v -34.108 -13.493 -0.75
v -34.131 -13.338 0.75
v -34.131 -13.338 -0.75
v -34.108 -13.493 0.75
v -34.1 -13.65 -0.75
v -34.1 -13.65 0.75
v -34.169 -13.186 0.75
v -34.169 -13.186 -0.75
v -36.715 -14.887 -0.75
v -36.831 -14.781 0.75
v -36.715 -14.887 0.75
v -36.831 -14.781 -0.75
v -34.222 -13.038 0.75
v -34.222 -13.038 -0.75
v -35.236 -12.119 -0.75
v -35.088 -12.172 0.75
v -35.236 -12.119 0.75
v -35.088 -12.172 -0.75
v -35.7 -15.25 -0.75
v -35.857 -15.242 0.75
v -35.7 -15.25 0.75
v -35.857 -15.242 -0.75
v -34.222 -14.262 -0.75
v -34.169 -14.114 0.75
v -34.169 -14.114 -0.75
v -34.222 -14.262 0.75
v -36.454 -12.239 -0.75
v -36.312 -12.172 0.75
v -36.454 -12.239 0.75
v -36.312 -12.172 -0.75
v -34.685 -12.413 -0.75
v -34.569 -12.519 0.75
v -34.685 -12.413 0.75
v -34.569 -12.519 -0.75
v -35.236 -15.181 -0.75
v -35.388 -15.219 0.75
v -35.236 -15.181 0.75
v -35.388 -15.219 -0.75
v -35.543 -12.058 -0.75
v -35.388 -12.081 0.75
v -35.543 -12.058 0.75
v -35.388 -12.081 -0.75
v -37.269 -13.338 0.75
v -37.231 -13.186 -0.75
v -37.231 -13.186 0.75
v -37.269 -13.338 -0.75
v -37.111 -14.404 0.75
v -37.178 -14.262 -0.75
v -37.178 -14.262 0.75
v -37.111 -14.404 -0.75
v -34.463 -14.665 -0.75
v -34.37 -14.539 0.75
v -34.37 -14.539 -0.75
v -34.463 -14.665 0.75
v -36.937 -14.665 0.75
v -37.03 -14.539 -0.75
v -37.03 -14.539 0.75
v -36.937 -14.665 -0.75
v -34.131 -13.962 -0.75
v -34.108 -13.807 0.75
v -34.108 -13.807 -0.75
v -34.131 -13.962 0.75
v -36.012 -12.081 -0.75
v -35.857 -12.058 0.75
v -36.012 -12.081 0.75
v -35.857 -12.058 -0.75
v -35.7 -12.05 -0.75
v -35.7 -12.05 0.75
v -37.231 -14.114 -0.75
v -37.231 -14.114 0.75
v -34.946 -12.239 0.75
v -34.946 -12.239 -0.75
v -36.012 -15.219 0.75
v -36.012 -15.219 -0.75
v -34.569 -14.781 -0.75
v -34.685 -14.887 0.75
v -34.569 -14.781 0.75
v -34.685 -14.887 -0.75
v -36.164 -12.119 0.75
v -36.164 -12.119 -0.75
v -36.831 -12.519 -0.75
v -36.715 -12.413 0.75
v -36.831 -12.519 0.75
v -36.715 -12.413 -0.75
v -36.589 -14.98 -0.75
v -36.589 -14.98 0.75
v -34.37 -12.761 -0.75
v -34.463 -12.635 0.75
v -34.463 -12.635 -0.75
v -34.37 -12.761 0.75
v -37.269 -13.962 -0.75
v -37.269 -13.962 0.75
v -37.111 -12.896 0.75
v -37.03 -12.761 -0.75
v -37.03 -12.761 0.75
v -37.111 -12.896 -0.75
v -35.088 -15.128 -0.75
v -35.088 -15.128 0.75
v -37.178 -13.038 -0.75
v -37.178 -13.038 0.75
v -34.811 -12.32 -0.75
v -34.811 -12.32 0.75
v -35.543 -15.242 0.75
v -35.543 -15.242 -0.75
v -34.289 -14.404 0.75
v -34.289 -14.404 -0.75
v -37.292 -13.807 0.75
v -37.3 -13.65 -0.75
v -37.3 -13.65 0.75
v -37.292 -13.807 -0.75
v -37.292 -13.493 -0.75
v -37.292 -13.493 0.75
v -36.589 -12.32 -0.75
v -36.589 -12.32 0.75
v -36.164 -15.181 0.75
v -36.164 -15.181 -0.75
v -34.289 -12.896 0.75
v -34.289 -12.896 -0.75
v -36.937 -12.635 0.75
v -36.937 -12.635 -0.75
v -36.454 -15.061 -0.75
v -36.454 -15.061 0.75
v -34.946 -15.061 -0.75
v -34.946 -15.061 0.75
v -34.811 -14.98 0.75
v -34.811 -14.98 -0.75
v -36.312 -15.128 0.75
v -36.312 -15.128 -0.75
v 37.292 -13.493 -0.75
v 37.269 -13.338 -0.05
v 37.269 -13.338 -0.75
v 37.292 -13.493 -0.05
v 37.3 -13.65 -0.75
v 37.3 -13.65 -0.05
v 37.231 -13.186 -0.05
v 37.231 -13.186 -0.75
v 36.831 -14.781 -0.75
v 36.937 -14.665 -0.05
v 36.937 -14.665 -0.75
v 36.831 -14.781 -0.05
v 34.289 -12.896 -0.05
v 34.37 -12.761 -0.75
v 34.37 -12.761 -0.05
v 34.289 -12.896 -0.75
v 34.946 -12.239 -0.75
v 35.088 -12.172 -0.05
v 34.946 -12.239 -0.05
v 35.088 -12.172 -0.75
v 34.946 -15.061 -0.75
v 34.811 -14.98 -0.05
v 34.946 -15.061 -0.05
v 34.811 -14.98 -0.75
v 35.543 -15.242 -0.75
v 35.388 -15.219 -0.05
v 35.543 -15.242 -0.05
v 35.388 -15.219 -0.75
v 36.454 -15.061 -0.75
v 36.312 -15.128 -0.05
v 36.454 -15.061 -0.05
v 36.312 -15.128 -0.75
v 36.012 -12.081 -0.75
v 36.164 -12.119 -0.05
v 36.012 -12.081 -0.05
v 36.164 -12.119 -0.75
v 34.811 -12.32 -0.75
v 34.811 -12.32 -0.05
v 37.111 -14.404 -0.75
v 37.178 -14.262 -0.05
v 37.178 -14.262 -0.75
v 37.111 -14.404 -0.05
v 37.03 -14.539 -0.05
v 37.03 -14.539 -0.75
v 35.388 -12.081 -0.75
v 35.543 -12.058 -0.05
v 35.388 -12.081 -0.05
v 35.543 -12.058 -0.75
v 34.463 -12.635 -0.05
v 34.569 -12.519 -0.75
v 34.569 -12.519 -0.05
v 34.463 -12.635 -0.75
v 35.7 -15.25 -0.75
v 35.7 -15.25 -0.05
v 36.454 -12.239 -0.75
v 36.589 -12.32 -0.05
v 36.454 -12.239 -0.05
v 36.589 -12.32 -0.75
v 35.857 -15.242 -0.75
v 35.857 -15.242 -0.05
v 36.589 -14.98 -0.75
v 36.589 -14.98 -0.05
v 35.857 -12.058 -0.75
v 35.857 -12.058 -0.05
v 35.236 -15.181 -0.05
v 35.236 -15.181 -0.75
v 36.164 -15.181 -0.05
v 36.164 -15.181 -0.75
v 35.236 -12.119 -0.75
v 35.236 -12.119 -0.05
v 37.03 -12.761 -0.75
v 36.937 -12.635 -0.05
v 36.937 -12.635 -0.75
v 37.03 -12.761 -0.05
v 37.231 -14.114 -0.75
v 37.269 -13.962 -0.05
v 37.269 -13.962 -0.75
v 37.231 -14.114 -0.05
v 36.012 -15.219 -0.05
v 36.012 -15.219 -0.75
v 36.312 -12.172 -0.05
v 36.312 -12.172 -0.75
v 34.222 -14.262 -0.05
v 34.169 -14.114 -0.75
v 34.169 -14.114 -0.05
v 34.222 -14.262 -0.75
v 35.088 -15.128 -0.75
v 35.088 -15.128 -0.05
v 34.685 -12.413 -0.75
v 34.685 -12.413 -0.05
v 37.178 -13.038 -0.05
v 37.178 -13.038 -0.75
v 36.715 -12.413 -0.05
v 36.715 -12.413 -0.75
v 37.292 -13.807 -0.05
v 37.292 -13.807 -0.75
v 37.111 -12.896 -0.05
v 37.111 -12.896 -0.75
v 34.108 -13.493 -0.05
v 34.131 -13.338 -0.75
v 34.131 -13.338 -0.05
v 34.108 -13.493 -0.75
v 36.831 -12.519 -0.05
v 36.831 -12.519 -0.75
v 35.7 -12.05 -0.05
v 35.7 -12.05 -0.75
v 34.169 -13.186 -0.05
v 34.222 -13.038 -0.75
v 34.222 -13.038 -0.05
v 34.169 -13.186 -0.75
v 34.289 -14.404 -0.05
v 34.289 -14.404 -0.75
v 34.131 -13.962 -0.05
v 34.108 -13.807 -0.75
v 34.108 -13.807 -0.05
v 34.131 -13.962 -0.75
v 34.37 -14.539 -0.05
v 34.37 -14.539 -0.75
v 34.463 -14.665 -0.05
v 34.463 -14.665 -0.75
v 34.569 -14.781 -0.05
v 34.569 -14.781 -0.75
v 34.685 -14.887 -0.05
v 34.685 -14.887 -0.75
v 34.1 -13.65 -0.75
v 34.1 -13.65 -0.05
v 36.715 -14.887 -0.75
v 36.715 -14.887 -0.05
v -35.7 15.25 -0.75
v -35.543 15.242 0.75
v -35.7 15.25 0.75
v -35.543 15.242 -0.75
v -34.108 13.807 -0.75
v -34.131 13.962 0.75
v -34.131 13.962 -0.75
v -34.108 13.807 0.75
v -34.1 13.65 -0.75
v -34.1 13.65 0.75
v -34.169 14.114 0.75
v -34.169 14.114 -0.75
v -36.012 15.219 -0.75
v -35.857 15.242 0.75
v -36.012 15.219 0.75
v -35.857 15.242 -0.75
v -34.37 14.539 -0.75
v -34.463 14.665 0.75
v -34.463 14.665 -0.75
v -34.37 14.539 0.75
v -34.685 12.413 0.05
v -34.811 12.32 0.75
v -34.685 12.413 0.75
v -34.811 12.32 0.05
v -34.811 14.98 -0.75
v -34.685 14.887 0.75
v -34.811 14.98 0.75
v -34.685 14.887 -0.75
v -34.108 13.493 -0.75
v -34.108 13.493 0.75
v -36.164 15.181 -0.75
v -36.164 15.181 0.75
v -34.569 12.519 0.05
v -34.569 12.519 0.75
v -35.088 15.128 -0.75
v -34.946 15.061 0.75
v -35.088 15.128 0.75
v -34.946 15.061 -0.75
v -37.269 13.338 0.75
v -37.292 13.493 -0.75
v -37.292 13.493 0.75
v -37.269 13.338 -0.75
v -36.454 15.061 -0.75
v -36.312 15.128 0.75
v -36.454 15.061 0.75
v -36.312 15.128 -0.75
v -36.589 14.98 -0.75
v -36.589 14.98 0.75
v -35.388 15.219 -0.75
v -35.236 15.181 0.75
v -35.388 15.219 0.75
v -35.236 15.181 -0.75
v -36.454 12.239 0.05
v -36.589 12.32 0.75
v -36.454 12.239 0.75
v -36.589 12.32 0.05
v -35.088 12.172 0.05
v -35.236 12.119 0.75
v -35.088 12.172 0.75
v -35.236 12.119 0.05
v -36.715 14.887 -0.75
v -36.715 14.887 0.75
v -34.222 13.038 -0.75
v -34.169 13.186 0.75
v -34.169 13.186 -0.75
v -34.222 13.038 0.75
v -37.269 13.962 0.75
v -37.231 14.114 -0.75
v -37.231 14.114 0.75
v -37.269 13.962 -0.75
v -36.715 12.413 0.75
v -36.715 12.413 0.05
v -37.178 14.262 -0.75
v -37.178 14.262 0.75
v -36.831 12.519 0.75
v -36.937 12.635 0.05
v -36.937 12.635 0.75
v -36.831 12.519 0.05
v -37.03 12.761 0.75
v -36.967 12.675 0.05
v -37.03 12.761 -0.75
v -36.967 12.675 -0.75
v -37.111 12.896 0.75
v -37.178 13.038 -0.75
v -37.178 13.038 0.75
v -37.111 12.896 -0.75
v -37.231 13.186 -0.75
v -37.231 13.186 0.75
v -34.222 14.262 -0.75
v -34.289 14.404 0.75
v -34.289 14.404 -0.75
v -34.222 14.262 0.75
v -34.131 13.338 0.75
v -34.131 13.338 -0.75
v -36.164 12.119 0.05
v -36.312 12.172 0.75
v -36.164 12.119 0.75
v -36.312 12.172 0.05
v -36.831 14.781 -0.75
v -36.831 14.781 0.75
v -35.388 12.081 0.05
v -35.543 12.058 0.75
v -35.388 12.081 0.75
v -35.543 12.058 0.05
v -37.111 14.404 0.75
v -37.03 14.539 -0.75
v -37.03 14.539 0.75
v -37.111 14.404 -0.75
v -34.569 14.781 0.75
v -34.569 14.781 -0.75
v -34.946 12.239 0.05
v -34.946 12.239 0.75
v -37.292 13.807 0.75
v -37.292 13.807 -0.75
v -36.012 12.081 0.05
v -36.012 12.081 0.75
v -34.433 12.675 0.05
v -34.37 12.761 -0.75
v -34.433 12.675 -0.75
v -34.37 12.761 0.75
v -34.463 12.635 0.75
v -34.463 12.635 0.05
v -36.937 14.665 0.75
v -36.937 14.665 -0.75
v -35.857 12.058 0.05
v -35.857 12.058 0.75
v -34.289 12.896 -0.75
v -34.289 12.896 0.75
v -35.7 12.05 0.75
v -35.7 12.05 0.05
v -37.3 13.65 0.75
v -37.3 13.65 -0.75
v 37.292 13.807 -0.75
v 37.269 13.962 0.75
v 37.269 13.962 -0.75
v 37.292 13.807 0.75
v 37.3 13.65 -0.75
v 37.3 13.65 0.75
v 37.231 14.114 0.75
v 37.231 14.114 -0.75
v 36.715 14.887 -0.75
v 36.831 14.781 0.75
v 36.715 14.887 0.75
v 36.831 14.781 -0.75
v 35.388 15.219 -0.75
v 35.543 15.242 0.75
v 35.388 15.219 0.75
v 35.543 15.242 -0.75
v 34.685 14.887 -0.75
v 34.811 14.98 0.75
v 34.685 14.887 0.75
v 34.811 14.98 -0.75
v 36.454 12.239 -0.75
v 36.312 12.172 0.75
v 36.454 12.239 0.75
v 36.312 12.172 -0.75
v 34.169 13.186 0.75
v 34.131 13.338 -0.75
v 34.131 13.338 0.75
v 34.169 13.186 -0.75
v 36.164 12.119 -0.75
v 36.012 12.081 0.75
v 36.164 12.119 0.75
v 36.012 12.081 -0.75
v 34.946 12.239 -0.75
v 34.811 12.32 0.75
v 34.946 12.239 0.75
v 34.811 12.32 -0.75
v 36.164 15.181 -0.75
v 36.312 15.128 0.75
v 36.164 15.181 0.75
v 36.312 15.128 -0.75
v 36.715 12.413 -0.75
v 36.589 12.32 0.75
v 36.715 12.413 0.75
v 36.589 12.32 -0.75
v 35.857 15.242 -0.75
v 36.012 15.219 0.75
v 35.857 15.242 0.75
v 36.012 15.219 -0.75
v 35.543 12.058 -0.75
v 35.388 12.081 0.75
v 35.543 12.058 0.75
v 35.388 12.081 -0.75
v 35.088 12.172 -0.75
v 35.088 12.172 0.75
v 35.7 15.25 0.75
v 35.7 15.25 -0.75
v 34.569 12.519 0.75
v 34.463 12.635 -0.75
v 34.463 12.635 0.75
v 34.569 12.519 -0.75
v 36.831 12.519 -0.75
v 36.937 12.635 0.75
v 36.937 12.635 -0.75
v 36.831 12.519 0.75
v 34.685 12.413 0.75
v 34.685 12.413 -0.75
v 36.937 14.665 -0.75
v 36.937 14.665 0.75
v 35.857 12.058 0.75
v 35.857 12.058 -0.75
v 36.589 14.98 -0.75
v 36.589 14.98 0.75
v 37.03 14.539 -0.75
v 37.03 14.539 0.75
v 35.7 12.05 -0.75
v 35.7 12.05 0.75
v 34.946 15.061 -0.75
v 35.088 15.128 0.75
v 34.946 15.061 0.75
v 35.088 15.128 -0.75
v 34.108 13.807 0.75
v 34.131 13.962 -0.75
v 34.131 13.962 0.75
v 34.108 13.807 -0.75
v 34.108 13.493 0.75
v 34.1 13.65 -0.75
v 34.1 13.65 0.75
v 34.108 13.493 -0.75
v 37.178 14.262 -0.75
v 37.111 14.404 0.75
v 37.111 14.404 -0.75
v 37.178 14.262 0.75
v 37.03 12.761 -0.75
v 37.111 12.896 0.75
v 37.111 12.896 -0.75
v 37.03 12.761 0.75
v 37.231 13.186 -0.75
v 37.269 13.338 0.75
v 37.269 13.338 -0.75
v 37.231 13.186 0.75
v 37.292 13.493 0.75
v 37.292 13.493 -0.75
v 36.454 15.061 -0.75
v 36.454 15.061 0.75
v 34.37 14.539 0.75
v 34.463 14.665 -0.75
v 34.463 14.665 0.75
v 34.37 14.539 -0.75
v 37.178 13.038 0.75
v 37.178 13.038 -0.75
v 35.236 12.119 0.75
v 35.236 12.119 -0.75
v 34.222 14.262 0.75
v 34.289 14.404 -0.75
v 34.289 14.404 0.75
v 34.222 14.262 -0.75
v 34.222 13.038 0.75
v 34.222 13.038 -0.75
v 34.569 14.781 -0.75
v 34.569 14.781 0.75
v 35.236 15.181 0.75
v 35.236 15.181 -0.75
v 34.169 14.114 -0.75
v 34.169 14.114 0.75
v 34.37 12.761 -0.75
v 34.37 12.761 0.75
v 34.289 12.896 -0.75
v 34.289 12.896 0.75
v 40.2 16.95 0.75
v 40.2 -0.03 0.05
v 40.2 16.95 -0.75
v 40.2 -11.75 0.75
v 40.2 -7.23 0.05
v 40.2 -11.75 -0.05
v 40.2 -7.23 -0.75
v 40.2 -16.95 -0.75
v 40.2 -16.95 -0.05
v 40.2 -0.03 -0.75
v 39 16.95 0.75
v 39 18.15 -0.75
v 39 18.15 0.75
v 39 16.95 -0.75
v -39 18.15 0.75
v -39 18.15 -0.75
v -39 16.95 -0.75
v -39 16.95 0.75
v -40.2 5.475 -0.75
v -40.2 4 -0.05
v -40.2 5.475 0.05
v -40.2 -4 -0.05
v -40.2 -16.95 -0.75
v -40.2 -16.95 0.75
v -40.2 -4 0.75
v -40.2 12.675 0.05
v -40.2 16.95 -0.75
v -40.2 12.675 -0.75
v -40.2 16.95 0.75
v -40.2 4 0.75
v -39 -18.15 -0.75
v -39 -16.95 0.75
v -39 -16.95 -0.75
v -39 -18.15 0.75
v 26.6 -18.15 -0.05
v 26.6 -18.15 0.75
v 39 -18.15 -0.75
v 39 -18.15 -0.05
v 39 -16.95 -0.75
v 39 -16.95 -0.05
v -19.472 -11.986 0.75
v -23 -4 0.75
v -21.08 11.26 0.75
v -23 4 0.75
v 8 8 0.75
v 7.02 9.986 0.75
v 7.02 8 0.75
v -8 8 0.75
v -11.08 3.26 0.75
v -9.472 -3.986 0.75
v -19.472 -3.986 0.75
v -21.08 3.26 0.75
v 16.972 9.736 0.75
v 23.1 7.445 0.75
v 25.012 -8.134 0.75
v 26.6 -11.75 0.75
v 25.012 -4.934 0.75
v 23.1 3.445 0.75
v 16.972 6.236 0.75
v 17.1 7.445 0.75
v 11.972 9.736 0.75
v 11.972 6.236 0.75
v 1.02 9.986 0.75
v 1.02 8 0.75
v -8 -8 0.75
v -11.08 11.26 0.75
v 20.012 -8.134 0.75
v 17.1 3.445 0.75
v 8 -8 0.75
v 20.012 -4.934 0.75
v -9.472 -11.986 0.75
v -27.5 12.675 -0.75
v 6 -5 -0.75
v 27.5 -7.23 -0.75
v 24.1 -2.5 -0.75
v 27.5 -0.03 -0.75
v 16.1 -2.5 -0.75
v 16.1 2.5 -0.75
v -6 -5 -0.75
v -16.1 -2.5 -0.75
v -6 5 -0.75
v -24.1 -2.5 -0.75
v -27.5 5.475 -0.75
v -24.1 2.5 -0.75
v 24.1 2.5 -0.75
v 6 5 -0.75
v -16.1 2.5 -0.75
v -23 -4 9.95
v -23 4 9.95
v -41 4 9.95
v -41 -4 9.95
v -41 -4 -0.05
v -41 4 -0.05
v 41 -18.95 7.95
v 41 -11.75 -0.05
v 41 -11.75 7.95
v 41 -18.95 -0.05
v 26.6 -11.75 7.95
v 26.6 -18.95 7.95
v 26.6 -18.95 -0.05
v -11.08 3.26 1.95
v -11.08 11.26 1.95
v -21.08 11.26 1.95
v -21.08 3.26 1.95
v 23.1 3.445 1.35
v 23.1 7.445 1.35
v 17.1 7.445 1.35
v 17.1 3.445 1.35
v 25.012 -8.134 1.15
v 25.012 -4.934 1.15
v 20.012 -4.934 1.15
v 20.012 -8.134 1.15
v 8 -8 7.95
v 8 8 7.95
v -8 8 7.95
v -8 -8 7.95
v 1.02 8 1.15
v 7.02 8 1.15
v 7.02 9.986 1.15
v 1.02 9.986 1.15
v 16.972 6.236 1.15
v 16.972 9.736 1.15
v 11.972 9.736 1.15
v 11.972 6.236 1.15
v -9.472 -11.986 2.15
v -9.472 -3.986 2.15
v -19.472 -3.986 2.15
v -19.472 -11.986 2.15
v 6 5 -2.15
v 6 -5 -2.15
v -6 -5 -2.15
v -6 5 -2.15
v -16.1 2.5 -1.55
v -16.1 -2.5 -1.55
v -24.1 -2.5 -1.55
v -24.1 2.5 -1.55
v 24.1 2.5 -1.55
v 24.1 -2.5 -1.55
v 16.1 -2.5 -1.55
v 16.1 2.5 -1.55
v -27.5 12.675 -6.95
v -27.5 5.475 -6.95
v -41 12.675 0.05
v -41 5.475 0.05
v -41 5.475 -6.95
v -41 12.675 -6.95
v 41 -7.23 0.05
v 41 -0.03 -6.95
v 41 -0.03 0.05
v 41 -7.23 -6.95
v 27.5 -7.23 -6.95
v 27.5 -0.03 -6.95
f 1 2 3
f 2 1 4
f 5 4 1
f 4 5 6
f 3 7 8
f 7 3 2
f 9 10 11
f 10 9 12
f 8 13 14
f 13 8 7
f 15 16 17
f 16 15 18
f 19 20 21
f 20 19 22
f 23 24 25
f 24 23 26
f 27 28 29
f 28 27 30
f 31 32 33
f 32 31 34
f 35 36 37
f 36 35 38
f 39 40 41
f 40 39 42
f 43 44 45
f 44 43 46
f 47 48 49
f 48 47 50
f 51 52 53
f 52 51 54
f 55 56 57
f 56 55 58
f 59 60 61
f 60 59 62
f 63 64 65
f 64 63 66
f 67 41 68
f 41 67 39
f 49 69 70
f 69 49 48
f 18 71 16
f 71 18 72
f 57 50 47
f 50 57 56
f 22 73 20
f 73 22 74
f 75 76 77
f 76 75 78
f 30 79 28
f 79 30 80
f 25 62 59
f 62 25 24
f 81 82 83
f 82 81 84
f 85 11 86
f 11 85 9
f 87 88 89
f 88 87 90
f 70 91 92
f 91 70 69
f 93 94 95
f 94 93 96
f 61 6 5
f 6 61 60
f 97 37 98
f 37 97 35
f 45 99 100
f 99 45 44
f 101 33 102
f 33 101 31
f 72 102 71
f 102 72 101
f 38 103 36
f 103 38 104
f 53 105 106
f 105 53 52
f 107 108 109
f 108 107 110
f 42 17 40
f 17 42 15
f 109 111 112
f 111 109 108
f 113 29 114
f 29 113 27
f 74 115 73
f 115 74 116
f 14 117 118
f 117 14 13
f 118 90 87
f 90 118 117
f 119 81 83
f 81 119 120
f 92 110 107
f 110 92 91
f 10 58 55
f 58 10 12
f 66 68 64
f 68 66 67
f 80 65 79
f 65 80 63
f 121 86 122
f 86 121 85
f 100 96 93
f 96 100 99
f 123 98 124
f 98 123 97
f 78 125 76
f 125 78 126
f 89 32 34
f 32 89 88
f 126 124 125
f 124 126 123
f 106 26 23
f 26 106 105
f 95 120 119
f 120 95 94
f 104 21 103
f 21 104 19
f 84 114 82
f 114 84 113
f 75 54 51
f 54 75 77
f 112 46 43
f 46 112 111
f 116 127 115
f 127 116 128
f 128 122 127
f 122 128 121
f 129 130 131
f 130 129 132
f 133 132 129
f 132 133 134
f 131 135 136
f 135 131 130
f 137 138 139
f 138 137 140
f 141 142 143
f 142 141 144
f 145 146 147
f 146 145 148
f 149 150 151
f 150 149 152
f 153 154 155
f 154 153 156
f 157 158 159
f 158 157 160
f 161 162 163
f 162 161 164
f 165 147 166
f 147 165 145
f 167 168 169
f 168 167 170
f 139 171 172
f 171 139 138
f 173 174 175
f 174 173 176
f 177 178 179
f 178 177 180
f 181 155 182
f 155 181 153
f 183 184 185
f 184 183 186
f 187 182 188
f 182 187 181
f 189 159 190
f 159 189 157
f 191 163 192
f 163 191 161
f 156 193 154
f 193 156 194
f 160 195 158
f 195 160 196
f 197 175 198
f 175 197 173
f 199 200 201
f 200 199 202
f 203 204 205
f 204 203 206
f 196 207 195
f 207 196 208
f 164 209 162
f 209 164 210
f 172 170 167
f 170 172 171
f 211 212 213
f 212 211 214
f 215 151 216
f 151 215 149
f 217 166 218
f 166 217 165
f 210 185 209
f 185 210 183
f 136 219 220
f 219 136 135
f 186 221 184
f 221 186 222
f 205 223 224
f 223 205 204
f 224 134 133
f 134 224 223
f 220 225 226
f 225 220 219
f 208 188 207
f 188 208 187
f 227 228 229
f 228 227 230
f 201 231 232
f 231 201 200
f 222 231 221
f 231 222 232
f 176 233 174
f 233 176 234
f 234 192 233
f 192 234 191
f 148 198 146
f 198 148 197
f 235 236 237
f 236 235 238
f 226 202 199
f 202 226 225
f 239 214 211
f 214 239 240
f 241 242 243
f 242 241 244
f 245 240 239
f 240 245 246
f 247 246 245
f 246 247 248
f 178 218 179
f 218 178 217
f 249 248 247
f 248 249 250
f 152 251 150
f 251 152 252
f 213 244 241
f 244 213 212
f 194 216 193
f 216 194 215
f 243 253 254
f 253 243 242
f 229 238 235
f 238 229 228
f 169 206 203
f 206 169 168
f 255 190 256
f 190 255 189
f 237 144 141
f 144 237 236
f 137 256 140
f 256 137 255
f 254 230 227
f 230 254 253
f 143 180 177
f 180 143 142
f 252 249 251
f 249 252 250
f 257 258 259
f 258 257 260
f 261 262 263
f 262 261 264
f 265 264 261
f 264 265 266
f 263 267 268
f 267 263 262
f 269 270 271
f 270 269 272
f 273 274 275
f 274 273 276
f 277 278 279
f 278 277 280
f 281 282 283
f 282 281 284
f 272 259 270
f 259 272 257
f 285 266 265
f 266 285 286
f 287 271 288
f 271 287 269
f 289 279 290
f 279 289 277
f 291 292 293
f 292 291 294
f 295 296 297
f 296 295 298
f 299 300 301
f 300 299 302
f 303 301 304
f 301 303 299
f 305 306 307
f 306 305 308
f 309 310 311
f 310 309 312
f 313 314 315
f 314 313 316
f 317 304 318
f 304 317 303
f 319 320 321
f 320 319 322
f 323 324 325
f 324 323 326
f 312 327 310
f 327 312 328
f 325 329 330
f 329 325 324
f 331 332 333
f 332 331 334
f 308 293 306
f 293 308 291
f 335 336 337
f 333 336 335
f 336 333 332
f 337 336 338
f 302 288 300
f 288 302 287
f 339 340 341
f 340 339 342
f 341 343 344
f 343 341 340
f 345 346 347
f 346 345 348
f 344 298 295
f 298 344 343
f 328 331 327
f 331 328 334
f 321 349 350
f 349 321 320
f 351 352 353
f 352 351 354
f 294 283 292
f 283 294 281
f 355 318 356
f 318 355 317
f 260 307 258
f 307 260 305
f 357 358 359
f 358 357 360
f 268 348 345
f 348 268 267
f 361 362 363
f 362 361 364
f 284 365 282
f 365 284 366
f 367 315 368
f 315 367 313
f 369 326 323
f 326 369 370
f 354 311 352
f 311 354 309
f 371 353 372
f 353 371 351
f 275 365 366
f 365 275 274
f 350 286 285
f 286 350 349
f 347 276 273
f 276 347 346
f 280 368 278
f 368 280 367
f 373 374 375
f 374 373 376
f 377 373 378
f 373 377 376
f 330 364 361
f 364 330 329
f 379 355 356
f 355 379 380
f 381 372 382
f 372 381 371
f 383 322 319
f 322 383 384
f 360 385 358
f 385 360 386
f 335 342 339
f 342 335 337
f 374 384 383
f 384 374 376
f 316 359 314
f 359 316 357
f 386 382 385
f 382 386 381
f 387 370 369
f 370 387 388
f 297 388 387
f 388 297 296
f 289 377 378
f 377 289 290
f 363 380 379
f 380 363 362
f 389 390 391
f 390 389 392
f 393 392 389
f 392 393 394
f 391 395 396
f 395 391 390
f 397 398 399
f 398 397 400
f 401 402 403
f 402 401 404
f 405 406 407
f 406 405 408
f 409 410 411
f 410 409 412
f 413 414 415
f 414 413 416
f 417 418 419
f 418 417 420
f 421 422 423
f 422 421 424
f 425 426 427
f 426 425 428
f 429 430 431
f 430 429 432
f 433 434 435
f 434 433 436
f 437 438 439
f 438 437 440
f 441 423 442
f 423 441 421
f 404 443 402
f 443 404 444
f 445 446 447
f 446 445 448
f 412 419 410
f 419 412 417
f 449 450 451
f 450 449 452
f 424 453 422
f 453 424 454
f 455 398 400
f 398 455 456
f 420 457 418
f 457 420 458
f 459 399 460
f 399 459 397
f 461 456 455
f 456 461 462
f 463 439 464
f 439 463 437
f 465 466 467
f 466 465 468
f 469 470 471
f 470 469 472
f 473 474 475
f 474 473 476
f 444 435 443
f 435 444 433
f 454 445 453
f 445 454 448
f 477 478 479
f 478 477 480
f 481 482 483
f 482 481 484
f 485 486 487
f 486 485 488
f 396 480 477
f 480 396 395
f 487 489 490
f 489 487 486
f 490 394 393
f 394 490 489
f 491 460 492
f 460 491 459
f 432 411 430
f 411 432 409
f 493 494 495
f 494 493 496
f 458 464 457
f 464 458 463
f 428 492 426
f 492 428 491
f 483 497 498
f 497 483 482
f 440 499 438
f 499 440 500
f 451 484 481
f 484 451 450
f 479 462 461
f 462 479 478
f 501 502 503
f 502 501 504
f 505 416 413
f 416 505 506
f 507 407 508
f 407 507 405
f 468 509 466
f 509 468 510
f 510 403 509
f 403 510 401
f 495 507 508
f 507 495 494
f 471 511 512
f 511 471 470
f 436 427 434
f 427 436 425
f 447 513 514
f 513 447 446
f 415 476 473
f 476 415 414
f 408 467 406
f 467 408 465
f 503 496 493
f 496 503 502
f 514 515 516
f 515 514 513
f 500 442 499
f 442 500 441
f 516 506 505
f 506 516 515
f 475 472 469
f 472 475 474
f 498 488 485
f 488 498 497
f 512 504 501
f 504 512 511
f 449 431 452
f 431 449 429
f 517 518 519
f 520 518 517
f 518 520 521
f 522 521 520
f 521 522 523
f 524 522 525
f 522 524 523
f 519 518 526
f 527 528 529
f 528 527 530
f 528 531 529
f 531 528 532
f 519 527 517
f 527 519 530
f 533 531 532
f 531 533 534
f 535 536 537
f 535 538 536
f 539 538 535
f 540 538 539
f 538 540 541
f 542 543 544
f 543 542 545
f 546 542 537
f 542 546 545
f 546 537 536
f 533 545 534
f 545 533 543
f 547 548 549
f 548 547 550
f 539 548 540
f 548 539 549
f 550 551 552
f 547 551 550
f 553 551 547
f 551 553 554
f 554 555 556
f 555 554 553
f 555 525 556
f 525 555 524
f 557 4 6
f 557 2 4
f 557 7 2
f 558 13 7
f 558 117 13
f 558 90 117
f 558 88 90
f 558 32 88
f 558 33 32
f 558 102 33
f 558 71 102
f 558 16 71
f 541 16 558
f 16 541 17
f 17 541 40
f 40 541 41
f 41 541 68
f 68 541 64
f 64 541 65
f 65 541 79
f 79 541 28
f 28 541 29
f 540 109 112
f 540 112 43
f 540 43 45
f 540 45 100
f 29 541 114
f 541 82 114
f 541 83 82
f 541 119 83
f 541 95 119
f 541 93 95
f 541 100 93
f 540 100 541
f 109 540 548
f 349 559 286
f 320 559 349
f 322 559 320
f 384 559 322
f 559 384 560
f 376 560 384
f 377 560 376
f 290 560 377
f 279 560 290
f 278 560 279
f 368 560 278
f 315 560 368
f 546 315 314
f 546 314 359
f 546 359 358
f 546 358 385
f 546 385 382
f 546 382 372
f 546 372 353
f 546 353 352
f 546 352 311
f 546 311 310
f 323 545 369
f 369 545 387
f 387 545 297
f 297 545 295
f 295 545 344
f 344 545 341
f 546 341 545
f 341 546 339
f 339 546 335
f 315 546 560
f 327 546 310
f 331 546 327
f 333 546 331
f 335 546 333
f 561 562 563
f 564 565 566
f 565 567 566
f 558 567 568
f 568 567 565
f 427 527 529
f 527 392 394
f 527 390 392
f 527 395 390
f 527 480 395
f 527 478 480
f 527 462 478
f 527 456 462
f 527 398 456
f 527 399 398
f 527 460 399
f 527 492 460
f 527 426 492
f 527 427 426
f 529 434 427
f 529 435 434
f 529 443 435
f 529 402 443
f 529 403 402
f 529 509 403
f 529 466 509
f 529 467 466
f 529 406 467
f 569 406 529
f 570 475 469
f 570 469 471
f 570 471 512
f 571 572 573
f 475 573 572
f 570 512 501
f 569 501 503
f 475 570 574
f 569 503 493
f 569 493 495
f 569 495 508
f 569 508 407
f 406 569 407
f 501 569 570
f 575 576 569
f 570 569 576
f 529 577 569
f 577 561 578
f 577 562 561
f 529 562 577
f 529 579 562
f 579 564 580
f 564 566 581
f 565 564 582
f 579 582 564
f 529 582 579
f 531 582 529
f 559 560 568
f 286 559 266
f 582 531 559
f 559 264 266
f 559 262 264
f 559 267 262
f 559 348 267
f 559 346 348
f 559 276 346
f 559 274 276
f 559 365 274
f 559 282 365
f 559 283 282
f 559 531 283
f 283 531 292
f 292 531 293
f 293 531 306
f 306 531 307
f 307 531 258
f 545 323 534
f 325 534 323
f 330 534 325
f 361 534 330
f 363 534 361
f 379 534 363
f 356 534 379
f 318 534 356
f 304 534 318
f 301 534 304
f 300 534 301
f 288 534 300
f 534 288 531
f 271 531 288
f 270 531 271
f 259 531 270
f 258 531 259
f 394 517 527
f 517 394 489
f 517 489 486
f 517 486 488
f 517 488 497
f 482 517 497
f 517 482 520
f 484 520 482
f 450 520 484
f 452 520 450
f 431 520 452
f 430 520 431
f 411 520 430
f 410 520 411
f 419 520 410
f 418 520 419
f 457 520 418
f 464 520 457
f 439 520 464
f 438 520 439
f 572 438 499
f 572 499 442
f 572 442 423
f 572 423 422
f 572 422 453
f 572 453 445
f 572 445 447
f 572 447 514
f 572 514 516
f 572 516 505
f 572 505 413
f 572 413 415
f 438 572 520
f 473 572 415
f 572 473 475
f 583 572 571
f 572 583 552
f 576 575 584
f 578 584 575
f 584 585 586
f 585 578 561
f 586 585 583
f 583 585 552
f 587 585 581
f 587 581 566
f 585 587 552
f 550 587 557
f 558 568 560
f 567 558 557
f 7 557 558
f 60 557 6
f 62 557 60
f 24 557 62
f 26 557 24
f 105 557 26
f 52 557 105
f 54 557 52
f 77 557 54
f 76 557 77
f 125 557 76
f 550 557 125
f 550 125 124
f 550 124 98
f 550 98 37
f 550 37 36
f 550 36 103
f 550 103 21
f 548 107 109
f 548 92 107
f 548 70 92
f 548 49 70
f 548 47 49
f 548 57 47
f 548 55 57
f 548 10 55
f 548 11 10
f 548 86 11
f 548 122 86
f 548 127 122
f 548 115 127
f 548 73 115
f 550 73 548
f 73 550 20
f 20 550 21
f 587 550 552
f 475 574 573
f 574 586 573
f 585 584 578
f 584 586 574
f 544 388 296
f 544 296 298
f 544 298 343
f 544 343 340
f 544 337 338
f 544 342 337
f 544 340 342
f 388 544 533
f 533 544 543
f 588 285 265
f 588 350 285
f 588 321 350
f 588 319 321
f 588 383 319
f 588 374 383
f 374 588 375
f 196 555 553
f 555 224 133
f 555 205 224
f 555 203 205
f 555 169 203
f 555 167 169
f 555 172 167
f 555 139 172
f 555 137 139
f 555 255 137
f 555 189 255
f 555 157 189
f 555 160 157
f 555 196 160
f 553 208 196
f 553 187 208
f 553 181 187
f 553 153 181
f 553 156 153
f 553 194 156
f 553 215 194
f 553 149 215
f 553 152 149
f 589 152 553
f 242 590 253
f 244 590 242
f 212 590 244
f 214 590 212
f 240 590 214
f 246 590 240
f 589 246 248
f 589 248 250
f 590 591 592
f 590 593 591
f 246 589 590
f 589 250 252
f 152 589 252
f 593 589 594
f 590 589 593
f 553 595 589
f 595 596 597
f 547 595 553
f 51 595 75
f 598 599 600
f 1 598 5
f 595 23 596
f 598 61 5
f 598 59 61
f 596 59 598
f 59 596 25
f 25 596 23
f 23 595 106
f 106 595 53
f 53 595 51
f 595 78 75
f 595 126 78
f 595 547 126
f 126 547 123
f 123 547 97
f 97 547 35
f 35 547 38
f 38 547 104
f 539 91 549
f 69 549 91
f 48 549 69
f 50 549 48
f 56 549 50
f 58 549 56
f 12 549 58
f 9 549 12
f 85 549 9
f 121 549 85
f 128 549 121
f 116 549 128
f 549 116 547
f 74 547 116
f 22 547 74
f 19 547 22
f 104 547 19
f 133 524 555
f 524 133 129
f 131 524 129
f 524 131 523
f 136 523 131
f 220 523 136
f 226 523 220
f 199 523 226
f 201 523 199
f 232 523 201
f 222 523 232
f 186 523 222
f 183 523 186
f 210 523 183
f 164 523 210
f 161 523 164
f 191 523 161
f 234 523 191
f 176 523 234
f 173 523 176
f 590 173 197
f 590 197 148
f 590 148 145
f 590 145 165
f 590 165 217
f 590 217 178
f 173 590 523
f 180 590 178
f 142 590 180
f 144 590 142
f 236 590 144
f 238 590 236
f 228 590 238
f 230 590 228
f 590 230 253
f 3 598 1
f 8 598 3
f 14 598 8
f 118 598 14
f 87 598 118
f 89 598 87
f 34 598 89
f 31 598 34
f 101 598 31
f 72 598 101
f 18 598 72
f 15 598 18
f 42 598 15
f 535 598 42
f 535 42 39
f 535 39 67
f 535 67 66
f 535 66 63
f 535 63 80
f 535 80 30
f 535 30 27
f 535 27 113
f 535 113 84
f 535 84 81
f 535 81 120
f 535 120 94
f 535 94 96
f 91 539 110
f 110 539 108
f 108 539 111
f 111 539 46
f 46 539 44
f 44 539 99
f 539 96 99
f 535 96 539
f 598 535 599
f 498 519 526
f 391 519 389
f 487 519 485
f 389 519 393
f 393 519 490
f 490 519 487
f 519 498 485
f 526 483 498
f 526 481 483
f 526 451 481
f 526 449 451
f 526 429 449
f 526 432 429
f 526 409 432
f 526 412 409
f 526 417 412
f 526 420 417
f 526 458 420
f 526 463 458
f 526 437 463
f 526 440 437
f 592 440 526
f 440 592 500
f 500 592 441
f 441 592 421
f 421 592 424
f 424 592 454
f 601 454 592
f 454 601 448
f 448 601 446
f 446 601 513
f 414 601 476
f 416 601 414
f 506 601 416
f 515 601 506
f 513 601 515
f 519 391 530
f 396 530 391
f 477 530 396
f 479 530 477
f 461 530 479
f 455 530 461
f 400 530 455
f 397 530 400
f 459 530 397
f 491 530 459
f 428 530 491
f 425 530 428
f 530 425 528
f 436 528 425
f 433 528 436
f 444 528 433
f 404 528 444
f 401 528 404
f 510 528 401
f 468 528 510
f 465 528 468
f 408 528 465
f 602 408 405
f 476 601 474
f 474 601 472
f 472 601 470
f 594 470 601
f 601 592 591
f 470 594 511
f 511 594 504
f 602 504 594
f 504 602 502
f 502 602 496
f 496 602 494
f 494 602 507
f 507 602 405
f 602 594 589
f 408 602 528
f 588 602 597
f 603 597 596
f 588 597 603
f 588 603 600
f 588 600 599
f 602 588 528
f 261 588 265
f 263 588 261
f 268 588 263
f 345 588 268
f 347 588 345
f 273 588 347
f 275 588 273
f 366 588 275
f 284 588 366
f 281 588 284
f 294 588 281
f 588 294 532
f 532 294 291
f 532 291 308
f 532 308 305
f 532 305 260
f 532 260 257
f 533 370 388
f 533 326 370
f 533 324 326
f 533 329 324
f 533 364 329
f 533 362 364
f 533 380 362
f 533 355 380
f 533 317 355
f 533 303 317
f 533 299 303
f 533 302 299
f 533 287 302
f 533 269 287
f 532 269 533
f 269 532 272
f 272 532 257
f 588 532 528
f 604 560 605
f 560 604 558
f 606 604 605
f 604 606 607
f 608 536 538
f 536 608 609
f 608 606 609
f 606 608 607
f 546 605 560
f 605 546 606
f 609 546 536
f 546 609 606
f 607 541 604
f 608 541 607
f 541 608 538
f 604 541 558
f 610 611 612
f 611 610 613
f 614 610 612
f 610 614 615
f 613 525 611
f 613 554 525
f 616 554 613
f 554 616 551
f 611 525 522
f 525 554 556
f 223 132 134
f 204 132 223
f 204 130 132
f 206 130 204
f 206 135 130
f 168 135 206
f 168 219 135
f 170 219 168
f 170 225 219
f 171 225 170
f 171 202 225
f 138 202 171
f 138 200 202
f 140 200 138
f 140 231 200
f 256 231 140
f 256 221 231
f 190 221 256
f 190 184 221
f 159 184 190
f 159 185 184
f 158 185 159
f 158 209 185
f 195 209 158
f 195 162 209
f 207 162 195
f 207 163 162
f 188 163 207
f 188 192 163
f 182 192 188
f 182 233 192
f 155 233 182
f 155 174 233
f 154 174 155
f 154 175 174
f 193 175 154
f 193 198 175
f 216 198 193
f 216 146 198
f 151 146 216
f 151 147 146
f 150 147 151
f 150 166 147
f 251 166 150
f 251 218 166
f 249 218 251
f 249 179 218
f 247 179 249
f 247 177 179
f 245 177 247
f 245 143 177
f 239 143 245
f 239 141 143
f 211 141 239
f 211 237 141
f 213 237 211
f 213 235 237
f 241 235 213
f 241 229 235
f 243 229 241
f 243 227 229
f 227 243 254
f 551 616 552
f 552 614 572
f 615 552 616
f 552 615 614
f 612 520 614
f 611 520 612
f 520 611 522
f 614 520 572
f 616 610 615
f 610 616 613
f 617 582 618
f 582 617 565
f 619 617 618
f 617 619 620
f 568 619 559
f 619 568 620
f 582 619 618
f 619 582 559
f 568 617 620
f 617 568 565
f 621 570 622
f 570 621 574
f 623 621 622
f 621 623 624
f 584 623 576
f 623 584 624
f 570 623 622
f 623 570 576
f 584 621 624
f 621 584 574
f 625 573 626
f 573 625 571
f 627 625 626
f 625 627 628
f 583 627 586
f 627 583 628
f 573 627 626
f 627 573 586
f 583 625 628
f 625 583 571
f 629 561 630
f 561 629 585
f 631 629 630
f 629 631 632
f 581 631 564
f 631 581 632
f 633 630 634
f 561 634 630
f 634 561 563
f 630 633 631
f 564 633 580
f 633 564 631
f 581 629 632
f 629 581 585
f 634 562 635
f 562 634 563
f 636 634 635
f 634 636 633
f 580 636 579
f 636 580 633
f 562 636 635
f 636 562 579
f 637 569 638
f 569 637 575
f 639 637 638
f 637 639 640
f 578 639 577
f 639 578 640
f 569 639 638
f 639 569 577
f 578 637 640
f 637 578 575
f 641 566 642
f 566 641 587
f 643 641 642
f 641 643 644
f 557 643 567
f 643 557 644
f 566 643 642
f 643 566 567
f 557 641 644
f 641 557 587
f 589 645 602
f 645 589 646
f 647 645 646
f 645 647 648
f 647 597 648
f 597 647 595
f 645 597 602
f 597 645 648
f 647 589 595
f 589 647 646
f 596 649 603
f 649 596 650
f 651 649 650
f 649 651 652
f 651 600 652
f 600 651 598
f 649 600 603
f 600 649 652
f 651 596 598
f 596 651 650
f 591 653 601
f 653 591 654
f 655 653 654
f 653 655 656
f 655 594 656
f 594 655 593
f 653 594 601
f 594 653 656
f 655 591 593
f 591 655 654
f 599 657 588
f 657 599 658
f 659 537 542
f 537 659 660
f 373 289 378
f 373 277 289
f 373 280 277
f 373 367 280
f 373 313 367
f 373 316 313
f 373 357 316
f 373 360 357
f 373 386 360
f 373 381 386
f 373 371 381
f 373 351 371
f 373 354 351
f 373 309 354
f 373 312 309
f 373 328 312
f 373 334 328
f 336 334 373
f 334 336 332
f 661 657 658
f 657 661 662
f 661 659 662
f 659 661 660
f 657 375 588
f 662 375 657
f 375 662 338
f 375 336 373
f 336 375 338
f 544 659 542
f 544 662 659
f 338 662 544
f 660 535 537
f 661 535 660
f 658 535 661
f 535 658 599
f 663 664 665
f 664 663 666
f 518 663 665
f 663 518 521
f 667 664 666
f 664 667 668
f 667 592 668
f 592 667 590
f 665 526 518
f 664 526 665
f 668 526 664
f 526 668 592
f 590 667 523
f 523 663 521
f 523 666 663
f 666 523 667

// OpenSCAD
$fn = 64;

//====================
// Parameters (mm)
//====================
pcb_L = 80.4;
pcb_W = 36.3;
pcb_T = 1.5;

overlap = 0.8;                 // intentional interpenetration to guarantee one connected solid
hole_d = 3.2;
hole_edge_margin = 4.5;

edge_chamfer_size = 1.2;

// Component heights (above PCB)
connector_H = 10;
connector_depth = 8;
connector_len = 18;

chip_T = 2;
chip1_L = 14;
chip1_W = 14;

chip2_L = 10;
chip2_W = 8;

heatsink_L = 16;
heatsink_W = 16;
heatsink_H = 8;

// Extra components to better match reference views
small1_L = chip2_L*0.6;
small1_W = chip2_W*0.5;
small1_T = chip_T*0.7;

small2_L = chip2_L*0.5;
small2_W = chip2_W*0.4;
small2_T = chip_T*0.6;

// Bottom-side components (to match bottom view)
bottom_chip_L = 12;
bottom_chip_W = 10;
bottom_chip_T = 2.2;

bottom_small_L = 8;
bottom_small_W = 5;
bottom_small_T = 1.6;

//====================
// Helpers
//====================
module pcb_mainboard_body() {
  color([0.0, 0.4, 0.2])
    cube([pcb_L, pcb_W, pcb_T], center=true);
}

module mounting_hole_cyl() {
  // Cut through PCB (and a bit extra) so holes are visible and guaranteed to subtract
  cylinder(h=pcb_T + 2*overlap, r=hole_d/2, center=true);
}

module edge_chamfer_cut_corner() {
  // Simple corner nibble (not a true chamfer, but matches simplified look)
  cube([edge_chamfer_size, edge_chamfer_size, pcb_T + 2*overlap], center=true);
}

module connector_body(L, D, H) {
  color([0.85, 0.85, 0.8])
    cube([L, D, H], center=true);
}

module chip_body(L, W, T) {
  color([0.1, 0.1, 0.6])
    cube([L, W, T], center=true);
}

module heatsink_body() {
  color([0.75, 0.75, 0.77])
    cube([heatsink_L, heatsink_W, heatsink_H], center=true);
}

//====================
// PCB with holes + corner cuts
//====================
module pcb_with_holes_and_chamfers() {
  difference() {
    pcb_mainboard_body();

    // Mounting holes
    union() {
      translate([-pcb_L/2 + hole_edge_margin, -pcb_W/2 + hole_edge_margin, 0]) mounting_hole_cyl();
      translate([ pcb_L/2 - hole_edge_margin, -pcb_W/2 + hole_edge_margin, 0]) mounting_hole_cyl();
      translate([-pcb_L/2 + hole_edge_margin,  pcb_W/2 - hole_edge_margin, 0]) mounting_hole_cyl();
      translate([ pcb_L/2 - hole_edge_margin,  pcb_W/2 - hole_edge_margin, 0]) mounting_hole_cyl();
    }

    // Corner nibbles
    union() {
      translate([ pcb_L/2 - edge_chamfer_size/2,  pcb_W/2 - edge_chamfer_size/2, 0]) edge_chamfer_cut_corner();
      translate([-pcb_L/2 + edge_chamfer_size/2,  pcb_W/2 - edge_chamfer_size/2, 0]) edge_chamfer_cut_corner();
      translate([-pcb_L/2 + edge_chamfer_size/2, -pcb_W/2 + edge_chamfer_size/2, 0]) edge_chamfer_cut_corner();
      translate([ pcb_L/2 - edge_chamfer_size/2, -pcb_W/2 + edge_chamfer_size/2, 0]) edge_chamfer_cut_corner();
    }
  }
}

//====================
// Top-side components (z+)
//====================
module top_side_components() {
  union() {
    // Left connector (front view: left side)
    translate([
      -pcb_L/2 + connector_len/2 - overlap,
      0,
      pcb_T/2 + connector_H/2 - overlap
    ]) connector_body(connector_len, connector_depth, connector_H);

    // Right connector (front view: bottom-right area)
    translate([
      pcb_L/2 - (connector_len*0.8)/2 + overlap,
      -pcb_W/2 + (connector_depth*0.9)/2 - overlap,
      pcb_T/2 + (connector_H*0.8)/2 - overlap
    ]) connector_body(connector_len*0.8, connector_depth*0.9, connector_H*0.8);

    // Main chip (center)
    translate([0, 0, pcb_T/2 + chip_T/2 - overlap])
      chip_body(chip1_L, chip1_W, chip_T);

    // Secondary chip (upper-left quadrant)
    translate([-pcb_L*0.2, pcb_W*0.2, pcb_T/2 + chip_T/2 - overlap])
      chip_body(chip2_L, chip2_W, chip_T);

    // Small components (right side)
    translate([pcb_L*0.25, pcb_W*0.15, pcb_T/2 + small1_T/2 - overlap])
      chip_body(small1_L, small1_W, small1_T);

    translate([pcb_L*0.28, -pcb_W*0.18, pcb_T/2 + small2_T/2 - overlap])
      chip_body(small2_L, small2_W, small2_T);

    // Heatsink (center, taller)
    translate([0, 0, pcb_T/2 + heatsink_H/2 - overlap])
      heatsink_body();

    // Extra small chips to better match side views (two small blue parts near top in right view)
    translate([pcb_L*0.05, pcb_W*0.22, pcb_T/2 + 1.2/2 - overlap])
      chip_body(6, 4, 1.2);

    translate([pcb_L*0.18, pcb_W*0.22, pcb_T/2 + 1.2/2 - overlap])
      chip_body(5, 3.5, 1.2);

    // Larger blue part near lower-left in right view
    translate([-pcb_L*0.18, -pcb_W*0.22, pcb_T/2 + 2.2/2 - overlap])
      chip_body(10, 8, 2.2);
  }
}

//====================
// Bottom-side components (z-)
// Ensure they overlap into PCB so the whole model is ONE connected solid.
//====================
module bottom_side_components() {
  union() {
    // Bottom central block (seen in bottom view)
    translate([0, 0, -pcb_T/2 - bottom_chip_T/2 + overlap])
      color([0.65, 0.65, 0.68])
        cube([bottom_chip_L, bottom_chip_W, bottom_chip_T], center=true);

    // Two small bottom chips (left/right)
    translate([-pcb_L*0.25, 0, -pcb_T/2 - bottom_small_T/2 + overlap])
      chip_body(bottom_small_L, bottom_small_W, bottom_small_T);

    translate([ pcb_L*0.25, 0, -pcb_T/2 - bottom_small_T/2 + overlap])
      chip_body(bottom_small_L, bottom_small_W, bottom_small_T);

    // Bottom-side connector-like blocks (to echo bottom view end blocks)
    translate([
      -pcb_L/2 + (connector_len*0.75)/2 - overlap,
      pcb_W*0.25,
      -pcb_T/2 - (connector_H*0.7)/2 + overlap
    ]) connector_body(connector_len*0.75, connector_depth*0.9, connector_H*0.7);

    translate([
      pcb_L/2 - (connector_len*0.75)/2 + overlap,
      -pcb_W*0.10,
      -pcb_T/2 - (connector_H*0.7)/2 + overlap
    ]) connector_body(connector_len*0.75, connector_depth*0.9, connector_H*0.7);
  }
}

//====================
// Complete model (single connected solid)
//====================
module complete_mainboard_model() {
  union() {
    pcb_with_holes_and_chamfers();
    top_side_components();
    bottom_side_components();
  }
}

complete_mainboard_model();
